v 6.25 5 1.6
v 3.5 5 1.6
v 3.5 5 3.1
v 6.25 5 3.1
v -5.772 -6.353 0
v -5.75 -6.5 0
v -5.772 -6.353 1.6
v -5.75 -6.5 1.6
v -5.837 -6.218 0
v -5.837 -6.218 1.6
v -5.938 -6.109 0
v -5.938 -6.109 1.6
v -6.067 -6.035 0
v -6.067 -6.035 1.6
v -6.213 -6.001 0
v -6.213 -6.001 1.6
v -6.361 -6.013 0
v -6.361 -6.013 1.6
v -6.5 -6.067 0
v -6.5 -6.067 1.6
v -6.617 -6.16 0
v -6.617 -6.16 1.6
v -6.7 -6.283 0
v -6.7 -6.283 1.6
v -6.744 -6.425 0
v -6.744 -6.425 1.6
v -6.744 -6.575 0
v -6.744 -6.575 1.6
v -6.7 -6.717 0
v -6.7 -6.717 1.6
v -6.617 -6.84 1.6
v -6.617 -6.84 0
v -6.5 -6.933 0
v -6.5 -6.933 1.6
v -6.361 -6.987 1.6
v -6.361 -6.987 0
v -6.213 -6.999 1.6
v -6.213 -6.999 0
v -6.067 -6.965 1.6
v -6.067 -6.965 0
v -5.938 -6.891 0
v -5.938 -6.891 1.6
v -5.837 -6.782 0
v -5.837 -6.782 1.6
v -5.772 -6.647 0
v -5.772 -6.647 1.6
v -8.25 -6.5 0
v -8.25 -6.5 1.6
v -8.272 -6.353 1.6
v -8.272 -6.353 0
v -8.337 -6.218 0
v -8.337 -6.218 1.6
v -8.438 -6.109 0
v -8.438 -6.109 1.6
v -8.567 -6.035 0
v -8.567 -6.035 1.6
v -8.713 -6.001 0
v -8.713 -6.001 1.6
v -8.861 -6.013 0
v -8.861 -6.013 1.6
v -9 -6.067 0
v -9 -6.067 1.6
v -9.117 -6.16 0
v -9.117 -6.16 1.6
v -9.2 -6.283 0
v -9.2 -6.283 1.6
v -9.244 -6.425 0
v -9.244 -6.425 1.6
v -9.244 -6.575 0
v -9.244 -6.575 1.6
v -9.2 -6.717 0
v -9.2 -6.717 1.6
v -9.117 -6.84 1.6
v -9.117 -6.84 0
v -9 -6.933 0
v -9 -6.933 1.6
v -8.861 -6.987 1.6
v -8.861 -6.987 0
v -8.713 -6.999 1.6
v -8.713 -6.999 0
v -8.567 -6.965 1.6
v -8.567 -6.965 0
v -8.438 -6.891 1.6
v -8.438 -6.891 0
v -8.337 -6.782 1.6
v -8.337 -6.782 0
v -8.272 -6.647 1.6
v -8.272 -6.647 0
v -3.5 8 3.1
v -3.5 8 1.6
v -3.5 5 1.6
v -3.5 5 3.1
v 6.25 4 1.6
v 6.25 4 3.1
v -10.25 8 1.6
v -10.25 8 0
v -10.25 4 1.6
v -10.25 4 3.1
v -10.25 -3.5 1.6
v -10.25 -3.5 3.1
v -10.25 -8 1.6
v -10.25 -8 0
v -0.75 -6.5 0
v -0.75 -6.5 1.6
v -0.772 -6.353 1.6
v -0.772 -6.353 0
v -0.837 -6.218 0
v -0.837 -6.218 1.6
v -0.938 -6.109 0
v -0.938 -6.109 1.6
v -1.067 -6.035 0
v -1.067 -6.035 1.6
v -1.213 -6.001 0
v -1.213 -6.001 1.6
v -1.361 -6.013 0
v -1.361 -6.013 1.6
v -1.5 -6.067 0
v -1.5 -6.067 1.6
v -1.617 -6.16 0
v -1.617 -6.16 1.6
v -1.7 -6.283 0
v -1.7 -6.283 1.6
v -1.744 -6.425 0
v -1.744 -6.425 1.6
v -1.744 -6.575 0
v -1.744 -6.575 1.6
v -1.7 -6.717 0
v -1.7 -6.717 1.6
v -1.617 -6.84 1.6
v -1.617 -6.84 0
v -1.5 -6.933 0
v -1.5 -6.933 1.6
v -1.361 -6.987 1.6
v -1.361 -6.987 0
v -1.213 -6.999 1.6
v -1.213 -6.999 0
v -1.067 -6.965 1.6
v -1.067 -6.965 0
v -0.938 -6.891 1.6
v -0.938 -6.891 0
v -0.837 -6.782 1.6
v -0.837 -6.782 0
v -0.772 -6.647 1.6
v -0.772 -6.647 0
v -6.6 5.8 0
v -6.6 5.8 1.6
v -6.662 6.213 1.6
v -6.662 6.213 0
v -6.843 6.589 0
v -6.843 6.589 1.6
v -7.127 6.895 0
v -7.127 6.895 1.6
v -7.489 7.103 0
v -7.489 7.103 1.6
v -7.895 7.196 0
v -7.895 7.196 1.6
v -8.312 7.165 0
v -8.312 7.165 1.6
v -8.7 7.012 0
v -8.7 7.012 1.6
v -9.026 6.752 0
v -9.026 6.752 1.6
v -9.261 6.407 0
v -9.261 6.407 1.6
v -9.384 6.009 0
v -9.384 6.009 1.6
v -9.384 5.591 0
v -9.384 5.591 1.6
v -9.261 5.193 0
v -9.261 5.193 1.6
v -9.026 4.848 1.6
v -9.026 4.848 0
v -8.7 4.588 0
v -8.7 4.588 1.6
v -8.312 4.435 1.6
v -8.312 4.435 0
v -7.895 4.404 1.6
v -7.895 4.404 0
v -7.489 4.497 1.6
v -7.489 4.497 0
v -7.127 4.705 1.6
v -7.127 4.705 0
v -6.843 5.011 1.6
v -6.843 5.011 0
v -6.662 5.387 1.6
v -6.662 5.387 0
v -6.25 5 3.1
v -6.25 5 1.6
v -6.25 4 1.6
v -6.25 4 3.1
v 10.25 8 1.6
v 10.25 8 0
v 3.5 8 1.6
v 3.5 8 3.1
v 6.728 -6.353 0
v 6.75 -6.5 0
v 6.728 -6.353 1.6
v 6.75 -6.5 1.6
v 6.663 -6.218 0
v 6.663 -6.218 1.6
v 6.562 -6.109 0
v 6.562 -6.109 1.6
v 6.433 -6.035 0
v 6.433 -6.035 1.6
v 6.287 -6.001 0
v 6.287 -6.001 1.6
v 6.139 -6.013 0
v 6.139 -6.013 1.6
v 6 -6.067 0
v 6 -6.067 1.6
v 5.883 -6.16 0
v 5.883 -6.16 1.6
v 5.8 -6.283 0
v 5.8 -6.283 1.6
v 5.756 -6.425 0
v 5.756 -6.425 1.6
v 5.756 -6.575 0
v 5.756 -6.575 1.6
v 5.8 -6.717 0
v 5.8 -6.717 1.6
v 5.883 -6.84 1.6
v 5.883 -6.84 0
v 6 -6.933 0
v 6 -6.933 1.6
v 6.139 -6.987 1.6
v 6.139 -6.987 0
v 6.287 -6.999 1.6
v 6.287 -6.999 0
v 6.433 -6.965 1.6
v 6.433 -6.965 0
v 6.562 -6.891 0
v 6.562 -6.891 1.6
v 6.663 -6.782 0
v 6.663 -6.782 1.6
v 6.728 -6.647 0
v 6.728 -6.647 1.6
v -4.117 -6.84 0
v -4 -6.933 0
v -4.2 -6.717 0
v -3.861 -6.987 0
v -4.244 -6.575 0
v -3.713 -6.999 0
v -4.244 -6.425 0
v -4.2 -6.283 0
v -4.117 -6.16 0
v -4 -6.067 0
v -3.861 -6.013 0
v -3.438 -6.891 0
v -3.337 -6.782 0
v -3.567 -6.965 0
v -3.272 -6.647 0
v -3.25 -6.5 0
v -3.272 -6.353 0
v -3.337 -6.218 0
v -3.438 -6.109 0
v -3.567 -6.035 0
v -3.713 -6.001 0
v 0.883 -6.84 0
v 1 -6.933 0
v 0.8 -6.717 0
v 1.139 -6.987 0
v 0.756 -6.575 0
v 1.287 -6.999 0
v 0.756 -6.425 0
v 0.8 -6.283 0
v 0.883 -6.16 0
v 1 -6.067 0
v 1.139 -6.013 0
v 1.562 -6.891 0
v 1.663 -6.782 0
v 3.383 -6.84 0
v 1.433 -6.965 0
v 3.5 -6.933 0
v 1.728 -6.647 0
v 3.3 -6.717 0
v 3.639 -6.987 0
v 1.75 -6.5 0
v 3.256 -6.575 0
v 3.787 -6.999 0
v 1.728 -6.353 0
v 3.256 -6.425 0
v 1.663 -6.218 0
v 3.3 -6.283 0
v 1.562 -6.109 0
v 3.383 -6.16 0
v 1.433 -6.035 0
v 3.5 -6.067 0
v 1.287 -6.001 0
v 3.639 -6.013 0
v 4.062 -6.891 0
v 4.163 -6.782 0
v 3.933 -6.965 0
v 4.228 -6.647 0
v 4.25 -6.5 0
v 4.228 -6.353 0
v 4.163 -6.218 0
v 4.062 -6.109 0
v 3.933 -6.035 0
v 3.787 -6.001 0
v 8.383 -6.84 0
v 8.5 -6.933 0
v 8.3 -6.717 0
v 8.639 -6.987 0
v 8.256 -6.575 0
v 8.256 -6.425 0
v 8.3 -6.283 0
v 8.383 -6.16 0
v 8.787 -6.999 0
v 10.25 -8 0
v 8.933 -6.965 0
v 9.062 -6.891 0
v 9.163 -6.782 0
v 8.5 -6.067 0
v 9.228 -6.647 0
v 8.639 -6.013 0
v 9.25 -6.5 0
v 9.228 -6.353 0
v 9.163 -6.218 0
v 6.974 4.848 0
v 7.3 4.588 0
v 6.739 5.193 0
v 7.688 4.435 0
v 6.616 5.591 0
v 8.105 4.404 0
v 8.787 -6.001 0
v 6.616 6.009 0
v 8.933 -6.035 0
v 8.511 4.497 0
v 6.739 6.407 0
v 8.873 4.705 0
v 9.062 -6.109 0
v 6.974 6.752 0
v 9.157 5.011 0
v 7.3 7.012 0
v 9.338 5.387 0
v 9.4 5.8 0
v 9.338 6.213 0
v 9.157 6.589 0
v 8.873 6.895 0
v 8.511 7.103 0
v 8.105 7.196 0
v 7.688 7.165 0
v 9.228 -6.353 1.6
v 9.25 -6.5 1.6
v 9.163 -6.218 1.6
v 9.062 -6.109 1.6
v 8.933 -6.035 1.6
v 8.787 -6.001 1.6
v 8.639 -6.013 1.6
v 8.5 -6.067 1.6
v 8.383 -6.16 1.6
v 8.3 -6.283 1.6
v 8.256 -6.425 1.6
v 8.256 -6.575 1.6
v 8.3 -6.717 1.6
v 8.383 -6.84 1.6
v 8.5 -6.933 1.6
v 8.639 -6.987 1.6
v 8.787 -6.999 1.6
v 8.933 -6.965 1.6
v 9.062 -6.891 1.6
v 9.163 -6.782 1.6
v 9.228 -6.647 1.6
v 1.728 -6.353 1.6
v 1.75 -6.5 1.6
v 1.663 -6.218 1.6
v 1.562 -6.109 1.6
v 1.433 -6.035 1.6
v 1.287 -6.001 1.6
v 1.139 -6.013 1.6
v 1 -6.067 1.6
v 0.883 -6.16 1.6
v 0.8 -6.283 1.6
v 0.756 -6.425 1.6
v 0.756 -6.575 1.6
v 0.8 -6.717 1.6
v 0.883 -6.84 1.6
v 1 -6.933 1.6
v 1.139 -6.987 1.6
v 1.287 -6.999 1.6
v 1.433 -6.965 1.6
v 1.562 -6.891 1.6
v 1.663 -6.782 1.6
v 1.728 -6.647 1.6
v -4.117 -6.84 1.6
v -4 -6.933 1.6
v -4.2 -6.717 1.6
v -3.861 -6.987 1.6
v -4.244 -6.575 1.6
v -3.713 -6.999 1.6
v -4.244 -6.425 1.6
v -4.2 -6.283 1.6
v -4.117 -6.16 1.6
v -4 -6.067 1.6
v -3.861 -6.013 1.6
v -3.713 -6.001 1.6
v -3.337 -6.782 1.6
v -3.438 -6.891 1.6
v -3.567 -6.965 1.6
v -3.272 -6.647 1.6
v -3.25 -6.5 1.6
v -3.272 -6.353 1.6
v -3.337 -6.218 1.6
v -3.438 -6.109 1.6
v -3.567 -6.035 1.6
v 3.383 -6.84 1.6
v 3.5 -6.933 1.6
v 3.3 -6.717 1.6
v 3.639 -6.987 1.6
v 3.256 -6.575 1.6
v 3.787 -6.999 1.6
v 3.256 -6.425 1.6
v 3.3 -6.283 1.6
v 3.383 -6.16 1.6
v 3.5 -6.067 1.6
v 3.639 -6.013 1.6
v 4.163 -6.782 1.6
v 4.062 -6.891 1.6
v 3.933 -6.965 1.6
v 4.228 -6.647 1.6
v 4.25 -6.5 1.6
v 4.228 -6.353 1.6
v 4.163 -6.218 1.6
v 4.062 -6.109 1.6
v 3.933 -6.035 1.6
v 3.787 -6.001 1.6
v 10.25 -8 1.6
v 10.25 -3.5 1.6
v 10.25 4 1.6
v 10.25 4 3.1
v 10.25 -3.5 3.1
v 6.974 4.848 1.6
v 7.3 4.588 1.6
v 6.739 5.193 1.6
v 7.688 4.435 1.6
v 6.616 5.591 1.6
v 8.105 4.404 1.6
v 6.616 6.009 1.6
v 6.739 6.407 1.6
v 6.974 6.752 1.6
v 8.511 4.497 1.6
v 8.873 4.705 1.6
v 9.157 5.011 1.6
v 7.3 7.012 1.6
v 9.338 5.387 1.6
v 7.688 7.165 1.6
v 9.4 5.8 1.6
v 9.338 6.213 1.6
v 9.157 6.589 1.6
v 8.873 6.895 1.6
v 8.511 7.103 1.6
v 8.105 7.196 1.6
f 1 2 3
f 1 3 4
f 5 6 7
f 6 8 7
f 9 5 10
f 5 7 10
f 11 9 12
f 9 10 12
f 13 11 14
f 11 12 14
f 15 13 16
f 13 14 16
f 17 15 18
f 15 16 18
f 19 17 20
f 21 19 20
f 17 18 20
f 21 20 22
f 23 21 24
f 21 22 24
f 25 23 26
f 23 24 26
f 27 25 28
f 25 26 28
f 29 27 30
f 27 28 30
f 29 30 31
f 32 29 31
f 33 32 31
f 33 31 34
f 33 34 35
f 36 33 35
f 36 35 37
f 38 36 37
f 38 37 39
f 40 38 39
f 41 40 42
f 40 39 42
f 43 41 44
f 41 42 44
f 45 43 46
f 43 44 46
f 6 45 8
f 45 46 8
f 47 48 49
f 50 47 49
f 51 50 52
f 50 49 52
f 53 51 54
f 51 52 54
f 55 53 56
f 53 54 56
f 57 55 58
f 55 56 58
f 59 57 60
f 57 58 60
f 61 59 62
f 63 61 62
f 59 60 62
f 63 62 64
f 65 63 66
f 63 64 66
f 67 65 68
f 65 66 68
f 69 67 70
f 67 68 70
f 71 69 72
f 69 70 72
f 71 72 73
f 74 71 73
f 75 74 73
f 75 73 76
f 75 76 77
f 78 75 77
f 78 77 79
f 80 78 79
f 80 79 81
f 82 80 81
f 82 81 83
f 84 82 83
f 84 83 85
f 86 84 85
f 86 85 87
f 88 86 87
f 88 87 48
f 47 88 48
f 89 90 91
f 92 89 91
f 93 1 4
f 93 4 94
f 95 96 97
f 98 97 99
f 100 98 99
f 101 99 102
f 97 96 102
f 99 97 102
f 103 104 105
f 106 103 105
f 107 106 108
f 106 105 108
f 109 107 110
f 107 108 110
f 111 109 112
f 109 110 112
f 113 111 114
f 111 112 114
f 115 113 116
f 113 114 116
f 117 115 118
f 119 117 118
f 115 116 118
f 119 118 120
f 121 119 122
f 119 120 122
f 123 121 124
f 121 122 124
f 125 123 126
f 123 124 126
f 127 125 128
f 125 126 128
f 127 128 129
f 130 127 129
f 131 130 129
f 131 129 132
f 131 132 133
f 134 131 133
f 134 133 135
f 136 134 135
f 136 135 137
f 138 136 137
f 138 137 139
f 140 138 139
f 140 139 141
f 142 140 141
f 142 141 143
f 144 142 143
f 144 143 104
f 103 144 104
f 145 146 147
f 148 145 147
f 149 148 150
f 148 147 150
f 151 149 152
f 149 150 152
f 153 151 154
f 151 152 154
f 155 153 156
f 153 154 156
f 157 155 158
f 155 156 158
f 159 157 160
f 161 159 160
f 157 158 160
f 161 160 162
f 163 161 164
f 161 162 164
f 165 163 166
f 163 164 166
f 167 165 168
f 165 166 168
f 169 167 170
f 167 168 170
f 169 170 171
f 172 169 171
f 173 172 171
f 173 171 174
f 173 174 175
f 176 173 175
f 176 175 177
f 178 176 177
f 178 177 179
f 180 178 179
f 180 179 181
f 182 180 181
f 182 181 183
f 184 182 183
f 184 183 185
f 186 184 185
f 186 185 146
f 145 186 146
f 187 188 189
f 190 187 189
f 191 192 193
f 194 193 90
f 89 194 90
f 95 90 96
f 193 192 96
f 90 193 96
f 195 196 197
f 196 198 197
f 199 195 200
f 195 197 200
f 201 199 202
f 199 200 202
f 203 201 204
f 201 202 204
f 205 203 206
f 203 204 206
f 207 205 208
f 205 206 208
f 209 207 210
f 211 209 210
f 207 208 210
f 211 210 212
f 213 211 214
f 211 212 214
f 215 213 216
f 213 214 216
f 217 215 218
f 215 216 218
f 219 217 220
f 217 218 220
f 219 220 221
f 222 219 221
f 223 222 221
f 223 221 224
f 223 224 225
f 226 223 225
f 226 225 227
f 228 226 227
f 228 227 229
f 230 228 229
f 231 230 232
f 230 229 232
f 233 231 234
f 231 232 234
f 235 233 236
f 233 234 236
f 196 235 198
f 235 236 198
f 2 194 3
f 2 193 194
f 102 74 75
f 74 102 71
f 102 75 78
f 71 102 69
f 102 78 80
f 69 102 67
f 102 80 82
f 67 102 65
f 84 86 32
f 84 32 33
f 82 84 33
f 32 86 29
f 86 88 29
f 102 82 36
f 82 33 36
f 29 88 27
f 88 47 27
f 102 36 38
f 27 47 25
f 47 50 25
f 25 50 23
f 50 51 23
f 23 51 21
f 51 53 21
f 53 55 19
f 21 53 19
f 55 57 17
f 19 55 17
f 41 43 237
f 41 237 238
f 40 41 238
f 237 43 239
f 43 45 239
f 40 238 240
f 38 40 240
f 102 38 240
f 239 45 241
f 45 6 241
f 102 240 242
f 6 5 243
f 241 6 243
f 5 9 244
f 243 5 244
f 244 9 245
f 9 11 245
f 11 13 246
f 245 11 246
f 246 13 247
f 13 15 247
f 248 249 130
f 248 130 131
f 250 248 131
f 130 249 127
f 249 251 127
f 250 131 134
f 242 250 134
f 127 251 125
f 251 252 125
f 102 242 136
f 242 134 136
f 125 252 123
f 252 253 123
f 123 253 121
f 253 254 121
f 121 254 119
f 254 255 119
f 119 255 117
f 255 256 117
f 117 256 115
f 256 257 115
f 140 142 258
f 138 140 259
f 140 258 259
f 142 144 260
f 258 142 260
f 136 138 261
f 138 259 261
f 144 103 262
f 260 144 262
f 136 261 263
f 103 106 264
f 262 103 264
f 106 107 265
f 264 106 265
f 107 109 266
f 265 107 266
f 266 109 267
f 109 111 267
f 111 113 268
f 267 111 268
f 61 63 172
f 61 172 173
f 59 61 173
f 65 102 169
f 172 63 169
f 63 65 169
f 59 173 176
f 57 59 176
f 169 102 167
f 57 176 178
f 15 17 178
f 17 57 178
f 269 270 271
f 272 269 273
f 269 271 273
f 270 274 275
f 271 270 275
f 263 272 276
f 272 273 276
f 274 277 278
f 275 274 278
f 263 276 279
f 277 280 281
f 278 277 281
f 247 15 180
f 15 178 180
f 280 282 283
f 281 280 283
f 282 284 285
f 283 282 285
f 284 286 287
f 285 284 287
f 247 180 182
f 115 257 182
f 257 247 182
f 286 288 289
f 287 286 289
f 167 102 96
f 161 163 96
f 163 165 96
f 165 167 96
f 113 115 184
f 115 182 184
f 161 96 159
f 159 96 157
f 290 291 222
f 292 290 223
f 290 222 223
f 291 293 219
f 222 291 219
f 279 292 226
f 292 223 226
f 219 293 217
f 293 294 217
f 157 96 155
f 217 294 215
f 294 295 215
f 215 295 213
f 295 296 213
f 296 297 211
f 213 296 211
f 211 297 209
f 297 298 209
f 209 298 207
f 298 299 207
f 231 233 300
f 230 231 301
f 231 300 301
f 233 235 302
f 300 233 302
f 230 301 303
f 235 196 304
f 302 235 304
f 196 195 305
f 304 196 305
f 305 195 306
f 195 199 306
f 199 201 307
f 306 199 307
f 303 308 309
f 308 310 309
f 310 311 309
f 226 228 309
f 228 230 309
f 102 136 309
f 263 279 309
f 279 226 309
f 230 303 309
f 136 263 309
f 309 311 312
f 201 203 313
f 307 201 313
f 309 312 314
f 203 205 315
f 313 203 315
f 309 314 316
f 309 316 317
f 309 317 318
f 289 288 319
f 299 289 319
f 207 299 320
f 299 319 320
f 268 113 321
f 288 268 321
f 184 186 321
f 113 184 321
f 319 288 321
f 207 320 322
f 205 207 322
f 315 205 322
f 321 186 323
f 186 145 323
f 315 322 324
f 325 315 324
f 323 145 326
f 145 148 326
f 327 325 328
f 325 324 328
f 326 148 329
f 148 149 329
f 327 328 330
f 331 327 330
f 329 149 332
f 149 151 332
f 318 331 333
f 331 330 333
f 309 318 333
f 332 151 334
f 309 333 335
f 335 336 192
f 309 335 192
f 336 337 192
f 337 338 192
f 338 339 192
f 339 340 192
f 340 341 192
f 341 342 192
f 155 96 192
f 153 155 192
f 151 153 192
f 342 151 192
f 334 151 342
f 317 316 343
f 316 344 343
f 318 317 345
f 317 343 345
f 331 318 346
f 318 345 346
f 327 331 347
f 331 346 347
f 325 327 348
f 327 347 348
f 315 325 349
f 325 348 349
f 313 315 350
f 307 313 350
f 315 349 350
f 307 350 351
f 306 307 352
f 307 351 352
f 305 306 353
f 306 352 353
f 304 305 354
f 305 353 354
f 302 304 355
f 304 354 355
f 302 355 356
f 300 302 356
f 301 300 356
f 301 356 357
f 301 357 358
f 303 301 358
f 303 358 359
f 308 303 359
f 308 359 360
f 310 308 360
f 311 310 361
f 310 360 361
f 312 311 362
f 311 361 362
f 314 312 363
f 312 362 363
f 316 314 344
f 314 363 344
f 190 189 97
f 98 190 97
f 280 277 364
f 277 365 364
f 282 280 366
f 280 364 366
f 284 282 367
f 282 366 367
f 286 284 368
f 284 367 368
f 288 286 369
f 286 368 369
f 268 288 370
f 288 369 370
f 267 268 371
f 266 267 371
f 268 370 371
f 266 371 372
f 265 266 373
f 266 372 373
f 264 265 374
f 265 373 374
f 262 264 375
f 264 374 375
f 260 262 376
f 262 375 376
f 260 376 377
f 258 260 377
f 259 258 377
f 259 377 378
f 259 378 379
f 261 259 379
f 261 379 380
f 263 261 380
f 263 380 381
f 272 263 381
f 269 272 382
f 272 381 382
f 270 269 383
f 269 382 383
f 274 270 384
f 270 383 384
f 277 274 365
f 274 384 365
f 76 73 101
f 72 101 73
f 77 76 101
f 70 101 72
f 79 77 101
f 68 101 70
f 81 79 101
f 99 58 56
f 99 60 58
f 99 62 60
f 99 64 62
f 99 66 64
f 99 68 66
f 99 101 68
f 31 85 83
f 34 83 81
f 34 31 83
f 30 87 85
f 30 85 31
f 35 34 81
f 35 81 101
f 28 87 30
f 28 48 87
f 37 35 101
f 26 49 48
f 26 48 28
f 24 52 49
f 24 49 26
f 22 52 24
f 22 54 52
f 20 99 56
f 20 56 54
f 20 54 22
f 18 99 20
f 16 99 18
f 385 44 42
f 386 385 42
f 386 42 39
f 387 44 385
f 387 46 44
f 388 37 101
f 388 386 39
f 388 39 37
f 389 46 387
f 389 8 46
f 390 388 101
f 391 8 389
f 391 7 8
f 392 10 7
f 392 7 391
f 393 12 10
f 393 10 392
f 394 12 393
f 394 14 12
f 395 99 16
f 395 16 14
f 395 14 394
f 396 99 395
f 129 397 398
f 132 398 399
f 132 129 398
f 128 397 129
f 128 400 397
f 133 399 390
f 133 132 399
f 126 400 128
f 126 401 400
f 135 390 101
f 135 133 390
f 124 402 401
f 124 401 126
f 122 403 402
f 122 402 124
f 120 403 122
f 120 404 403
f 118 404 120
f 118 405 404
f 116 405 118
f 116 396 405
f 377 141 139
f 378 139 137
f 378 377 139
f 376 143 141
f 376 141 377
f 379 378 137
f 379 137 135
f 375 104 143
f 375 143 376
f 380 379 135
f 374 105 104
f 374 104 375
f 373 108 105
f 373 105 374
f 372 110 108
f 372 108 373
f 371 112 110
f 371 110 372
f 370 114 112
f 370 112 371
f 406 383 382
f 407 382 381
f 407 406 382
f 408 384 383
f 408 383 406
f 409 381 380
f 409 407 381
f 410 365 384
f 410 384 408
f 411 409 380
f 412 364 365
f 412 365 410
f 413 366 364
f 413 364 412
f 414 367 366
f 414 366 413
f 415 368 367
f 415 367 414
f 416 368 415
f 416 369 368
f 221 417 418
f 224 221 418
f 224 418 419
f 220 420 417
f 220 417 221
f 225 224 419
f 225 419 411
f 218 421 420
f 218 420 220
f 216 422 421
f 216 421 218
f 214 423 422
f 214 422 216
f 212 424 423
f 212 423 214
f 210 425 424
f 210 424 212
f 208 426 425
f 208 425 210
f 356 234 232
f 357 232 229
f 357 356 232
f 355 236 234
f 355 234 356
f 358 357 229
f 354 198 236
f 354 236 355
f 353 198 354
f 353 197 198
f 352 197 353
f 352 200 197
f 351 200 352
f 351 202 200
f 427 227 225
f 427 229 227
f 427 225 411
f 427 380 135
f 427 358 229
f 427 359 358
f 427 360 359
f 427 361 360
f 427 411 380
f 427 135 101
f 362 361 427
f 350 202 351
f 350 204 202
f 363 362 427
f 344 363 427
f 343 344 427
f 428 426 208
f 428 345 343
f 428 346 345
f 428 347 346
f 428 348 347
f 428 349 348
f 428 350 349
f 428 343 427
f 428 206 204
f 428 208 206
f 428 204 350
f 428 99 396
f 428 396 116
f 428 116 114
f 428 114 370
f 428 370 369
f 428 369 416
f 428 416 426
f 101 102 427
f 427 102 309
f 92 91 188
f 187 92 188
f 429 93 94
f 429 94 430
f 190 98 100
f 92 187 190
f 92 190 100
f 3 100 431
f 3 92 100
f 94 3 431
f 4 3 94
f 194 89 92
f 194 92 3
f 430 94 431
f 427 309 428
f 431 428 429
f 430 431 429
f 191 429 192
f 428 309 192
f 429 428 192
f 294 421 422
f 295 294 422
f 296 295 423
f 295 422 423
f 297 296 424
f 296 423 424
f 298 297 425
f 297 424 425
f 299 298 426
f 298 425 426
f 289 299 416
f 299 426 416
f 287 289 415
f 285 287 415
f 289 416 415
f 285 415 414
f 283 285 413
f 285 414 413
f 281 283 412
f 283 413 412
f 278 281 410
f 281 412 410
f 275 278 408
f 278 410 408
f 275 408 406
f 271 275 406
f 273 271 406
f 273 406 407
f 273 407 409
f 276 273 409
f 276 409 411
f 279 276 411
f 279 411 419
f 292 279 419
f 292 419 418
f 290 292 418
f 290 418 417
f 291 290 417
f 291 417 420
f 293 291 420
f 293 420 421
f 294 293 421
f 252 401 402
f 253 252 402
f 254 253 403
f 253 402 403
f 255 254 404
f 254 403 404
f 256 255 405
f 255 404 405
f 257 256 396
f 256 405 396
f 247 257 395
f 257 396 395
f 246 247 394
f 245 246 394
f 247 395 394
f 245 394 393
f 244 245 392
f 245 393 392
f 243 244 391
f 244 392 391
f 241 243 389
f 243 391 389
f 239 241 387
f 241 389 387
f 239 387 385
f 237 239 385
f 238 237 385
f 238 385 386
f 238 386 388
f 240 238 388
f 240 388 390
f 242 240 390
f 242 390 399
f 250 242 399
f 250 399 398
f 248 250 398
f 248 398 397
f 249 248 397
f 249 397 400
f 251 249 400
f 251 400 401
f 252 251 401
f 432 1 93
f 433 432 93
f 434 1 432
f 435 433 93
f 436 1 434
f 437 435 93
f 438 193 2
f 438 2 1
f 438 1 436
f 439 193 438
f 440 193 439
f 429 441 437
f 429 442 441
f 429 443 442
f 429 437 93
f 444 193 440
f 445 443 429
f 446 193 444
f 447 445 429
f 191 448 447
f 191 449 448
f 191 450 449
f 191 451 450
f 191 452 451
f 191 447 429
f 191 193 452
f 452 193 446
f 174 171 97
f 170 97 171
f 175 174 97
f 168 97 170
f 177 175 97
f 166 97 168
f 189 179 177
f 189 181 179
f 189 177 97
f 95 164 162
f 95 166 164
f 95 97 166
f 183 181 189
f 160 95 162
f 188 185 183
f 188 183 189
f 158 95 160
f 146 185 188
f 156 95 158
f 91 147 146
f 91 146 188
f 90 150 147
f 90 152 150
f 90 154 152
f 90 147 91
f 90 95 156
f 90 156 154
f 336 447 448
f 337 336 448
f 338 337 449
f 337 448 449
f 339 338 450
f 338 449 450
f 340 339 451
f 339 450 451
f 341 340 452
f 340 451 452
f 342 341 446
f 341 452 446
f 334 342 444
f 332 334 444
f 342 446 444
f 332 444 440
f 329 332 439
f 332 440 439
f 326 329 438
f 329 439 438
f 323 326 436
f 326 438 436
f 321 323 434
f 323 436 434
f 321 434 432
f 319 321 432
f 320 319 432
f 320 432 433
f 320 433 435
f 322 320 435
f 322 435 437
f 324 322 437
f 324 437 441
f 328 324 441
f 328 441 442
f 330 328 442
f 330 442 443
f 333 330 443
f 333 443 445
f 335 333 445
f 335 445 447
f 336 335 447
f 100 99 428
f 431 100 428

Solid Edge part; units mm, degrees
sketch "Sketch1" plane through (0, 0, 0) normal (0, 0, 1) x (1, 0, 0)
  line L0 (-10.25, -8) -> (10.25, -8)
  line L1 (10.25, -8) -> (10.25, 8)
  line L2 (10.25, 8) -> (-10.25, 8)
  line L3 (-10.25, 8) -> (-10.25, -8)
  dimension "D1" = 20.5
  dimension "D2" = 16
extrude "Protrusion1" add sketch "Sketch1" along normal blind 1.6
sketch "Sketch2" plane through (0, 0, 1.6) normal (0, 0, 1) x (1, 0, 0)
  circle A0 centre (-8, 5.8) radius 1.4
  circle A1 centre (8, 5.8) radius 1.4
  dimension "D1" = 2.8
  dimension "D2" = 18.8
  dimension "D3" = 0.85
  dimension "D4" = 0.8
extrude "Cutout1" cut sketch "Sketch2" against normal through all
sketch "Sketch3" plane through (0, 0, 1.6) normal (0, 0, 1) x (1, 0, 0)
  line L0 (-10.25, -3.5) -> (10.25, -3.5)
  line L1 (10.25, -3.5) -> (10.25, 4)
  line L2 (6.25, 4) -> (10.25, 4)
  line L3 (6.25, 5) -> (6.25, 4)
  line L4 (3.5, 5) -> (6.25, 5)
  line L5 (3.5, 8) -> (3.5, 5)
  line L6 (3.5, 8) -> (-3.5, 8)
  line L7 (-3.5, 8) -> (-3.5, 5)
  line L8 (-3.5, 5) -> (-6.25, 5)
  line L9 (-6.25, 5) -> (-6.25, 4)
  line L10 (-6.25, 4) -> (-10.25, 4)
  line L11 (-10.25, 4) -> (-10.25, -3.5)
  dimension "D1" = 7
  dimension "D2" = 3
  dimension "D3" = 4.5
  dimension "D4" = 7.5
  dimension "D5" = 4
  dimension "D6" = 7.5
  dimension "D7" = 3
  dimension "D8" = 4
extrude "Extrusionsausprägung_2" add sketch "Sketch3" along normal blind 1.5
sketch "Sketch4" plane through (0, -5.75, 1.6) normal (0, 0, 1) x (1, 0, 0)
  circle A0 centre (-8.75, -0.75) radius 0.5
  circle A1 centre (-6.25, -0.75) radius 0.5
  circle A2 centre (-3.75, -0.75) radius 0.5
  circle A3 centre (-1.25, -0.75) radius 0.5
  circle A4 centre (1.25, -0.75) radius 0.5
  circle A5 centre (3.75, -0.75) radius 0.5
  circle A6 centre (6.25, -0.75) radius 0.5
  circle A7 centre (8.75, -0.75) radius 0.5
  dimension "D1" = 2.5
  dimension "D2" = 1
  dimension "D3" = 1.5
extrude "Cutout2" cut sketch "Sketch4" against normal through all
